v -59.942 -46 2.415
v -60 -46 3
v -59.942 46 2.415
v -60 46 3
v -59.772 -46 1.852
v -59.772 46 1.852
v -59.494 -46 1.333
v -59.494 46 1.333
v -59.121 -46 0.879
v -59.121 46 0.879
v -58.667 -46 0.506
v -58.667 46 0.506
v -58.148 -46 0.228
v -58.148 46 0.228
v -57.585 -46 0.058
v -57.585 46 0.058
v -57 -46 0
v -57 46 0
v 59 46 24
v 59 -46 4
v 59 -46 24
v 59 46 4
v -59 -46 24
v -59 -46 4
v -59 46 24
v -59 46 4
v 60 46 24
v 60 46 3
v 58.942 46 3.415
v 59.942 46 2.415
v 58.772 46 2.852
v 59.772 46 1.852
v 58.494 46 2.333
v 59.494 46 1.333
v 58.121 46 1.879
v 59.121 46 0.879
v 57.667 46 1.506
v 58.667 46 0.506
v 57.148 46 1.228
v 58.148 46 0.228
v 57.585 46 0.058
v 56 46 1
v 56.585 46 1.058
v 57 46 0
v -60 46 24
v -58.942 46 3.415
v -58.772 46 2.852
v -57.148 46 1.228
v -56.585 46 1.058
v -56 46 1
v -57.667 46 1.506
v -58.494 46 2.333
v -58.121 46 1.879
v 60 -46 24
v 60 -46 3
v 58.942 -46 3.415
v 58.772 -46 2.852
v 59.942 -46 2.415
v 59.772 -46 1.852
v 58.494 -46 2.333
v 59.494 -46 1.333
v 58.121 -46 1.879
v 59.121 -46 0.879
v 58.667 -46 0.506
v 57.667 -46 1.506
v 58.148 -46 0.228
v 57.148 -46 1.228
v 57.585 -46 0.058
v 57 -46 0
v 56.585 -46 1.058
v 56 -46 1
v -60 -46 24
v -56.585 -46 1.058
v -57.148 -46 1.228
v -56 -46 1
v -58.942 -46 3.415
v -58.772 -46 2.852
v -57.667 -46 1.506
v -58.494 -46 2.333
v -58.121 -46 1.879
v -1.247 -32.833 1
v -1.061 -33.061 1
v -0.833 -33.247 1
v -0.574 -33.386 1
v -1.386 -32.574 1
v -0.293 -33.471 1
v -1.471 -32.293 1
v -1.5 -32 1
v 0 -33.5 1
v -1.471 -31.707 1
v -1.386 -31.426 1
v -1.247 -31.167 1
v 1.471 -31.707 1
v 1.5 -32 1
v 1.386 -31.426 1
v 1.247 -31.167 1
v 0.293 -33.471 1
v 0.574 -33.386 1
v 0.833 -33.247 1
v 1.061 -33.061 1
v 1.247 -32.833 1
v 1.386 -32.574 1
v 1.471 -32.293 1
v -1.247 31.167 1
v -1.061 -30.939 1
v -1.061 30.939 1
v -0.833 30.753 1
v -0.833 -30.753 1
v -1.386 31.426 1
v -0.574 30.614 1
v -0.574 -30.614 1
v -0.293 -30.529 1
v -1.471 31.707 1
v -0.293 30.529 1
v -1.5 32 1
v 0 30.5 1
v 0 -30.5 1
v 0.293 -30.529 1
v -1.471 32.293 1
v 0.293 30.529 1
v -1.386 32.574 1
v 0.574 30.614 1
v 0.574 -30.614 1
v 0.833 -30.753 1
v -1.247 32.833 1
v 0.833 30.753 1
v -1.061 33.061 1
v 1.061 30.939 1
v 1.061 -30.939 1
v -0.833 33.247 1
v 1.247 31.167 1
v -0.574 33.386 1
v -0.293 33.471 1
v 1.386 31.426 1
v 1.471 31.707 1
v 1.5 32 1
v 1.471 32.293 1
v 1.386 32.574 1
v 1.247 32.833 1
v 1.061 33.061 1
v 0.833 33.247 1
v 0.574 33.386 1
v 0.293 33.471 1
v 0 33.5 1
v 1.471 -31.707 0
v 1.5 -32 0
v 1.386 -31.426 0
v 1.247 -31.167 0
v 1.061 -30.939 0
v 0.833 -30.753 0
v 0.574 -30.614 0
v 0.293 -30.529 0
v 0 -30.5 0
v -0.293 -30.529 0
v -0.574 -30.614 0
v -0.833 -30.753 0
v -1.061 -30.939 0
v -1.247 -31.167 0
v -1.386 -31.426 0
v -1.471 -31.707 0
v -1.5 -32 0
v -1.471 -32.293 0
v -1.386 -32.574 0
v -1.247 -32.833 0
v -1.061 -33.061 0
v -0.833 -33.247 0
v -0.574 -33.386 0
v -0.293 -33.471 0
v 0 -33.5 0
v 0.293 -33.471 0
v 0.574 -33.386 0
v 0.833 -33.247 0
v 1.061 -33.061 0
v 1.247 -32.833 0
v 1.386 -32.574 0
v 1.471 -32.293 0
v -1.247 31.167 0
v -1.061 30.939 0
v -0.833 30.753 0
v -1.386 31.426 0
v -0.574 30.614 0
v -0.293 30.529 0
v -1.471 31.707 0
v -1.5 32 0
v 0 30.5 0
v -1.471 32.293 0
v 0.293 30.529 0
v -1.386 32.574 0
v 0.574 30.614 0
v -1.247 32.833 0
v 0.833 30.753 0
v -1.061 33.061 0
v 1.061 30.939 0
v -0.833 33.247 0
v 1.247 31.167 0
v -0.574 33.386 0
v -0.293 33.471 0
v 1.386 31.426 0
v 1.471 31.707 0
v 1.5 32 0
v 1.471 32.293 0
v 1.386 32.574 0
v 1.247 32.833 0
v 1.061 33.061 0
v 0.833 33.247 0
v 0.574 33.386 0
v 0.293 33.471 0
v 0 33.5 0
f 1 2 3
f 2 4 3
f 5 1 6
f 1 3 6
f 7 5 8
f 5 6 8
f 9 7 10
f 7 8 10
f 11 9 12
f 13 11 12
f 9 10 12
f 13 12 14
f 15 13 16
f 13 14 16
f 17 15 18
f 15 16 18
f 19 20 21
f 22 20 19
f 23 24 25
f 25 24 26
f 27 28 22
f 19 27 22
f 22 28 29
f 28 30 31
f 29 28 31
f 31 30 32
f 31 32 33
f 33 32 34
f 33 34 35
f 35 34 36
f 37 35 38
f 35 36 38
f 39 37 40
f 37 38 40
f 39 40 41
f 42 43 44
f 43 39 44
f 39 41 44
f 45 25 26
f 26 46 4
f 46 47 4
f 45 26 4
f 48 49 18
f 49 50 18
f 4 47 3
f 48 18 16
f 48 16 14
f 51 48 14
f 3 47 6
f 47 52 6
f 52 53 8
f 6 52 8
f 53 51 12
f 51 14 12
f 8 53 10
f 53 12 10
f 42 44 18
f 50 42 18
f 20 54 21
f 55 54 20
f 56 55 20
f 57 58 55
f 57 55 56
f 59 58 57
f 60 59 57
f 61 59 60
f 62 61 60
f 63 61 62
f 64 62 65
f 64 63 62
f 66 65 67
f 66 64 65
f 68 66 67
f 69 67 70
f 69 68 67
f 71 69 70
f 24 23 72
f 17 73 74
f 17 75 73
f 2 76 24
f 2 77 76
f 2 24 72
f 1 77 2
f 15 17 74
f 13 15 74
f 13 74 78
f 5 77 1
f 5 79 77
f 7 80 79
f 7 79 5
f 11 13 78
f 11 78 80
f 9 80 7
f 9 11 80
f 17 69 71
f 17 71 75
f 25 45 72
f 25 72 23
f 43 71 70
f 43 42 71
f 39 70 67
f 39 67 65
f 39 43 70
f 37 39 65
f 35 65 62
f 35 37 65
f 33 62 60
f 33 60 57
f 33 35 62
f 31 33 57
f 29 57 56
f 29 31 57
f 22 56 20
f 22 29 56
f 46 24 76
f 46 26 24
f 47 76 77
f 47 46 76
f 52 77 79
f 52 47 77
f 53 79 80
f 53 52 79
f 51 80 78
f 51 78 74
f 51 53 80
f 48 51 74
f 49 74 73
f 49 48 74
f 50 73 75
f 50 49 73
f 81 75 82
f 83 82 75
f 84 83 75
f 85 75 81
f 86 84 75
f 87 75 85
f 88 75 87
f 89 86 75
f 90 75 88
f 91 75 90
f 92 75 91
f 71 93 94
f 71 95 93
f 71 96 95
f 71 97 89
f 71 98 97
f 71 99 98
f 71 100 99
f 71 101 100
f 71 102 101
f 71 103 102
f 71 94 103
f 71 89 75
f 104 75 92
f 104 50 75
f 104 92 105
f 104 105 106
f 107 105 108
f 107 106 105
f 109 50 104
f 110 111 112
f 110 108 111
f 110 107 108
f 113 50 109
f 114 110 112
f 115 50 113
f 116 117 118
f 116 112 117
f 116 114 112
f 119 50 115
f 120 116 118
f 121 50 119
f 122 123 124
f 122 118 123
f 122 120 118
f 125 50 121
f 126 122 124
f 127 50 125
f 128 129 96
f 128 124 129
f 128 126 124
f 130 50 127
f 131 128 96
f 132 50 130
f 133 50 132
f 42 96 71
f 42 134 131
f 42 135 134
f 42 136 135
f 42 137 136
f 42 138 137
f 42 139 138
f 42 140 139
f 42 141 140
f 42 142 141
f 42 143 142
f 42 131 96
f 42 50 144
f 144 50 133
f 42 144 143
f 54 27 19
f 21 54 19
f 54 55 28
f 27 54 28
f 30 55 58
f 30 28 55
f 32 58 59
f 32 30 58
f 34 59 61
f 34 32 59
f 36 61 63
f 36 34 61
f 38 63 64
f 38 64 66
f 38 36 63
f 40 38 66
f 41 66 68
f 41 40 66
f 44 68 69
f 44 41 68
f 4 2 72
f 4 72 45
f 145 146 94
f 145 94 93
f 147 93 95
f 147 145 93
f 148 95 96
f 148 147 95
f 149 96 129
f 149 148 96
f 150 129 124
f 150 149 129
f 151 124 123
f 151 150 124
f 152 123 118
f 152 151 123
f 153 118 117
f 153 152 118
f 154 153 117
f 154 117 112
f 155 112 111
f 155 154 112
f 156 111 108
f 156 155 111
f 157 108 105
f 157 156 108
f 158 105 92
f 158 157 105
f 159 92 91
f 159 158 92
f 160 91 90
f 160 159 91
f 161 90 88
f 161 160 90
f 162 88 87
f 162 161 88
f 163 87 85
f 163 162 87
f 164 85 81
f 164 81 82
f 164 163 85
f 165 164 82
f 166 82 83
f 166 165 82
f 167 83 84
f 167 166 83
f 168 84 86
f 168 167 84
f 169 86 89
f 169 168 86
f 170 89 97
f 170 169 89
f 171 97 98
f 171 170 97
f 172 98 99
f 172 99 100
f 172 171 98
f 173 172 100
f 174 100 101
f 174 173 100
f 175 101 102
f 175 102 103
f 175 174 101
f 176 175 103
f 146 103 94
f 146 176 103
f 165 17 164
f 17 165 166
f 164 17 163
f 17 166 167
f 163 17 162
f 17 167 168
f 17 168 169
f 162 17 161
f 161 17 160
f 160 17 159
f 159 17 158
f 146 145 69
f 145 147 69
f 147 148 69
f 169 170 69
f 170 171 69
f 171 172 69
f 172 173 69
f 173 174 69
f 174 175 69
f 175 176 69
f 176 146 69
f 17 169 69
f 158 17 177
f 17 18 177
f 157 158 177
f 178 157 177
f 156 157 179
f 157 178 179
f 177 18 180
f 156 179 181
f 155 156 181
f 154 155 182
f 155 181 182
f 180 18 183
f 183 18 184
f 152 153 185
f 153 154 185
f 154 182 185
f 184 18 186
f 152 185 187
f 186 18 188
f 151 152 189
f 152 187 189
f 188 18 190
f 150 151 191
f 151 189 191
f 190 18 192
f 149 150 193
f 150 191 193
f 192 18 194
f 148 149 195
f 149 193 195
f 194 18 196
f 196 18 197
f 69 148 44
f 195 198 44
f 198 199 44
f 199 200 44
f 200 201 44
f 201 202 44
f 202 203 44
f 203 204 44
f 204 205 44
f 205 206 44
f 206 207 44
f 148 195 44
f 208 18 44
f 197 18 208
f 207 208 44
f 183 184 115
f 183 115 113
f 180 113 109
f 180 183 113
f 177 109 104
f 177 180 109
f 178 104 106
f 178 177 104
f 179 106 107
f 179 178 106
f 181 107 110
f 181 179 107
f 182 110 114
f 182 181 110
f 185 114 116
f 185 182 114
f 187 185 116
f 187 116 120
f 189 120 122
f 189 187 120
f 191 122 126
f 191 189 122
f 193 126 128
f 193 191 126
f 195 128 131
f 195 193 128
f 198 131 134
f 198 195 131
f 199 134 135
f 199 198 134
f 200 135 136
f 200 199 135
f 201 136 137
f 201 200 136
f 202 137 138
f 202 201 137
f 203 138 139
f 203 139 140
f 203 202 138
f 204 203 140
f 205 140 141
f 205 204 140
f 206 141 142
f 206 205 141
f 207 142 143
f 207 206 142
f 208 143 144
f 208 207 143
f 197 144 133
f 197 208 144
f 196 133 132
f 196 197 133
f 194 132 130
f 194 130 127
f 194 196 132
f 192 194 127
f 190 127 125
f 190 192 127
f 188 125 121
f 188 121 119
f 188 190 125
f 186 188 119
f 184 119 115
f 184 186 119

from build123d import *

# Parameters (mm, degrees)
SKETCH1_W           = 120
SKETCH1_H           = 92
SKETCH1_R           = 1.5
BOSS_EXTRUDE1_DEPTH = 1
SKETCH2_W           = 1
SKETCH2_H           = 92
BOSS_EXTRUDE2_DEPTH = 23
FILLET1_R           = 3
FILLET2_R           = 3
FILLET3_R           = 3


with BuildPart() as part:
    # Sketch1 → Boss-Extrude1 (new body)
    with BuildSketch(Plane.XY):
        Rectangle(SKETCH1_W, SKETCH1_H)
        with Locations((0, -32)):
            Circle(SKETCH1_R, mode=Mode.SUBTRACT)
        with Locations(Location((0, 32, 0), (0, 0, 180))):
            Circle(SKETCH1_R, mode=Mode.SUBTRACT)
    extrude(amount=BOSS_EXTRUDE1_DEPTH)

    # Sketch2 → Boss-Extrude2 (add)
    with BuildSketch(Plane.XY.offset(1)):
        with Locations((-59.5, 0)):
            Rectangle(SKETCH2_W, SKETCH2_H)
    boss_extrude2 = extrude(amount=BOSS_EXTRUDE2_DEPTH)

    # Fillet1
    fillet1_edges = [part.edges().sort_by_distance(p)[0] for p in [
        (-60, 0, 0),
    ]]
    fillet(fillet1_edges, radius=FILLET1_R)

    # Fillet2
    fillet2_edges = [part.edges().sort_by_distance(p)[0] for p in [
        (-59, 0, 1),
    ]]
    fillet(fillet2_edges, radius=FILLET2_R)

    # Mirror3: Boss-Extrude2 across plane
    add(boss_extrude2.mirror(Plane(origin=(0, 0, 0), x_dir=(0, 0, 1), z_dir=(1, 0, 0))))

    # Fillet3
    fillet3_edges = [part.edges().sort_by_distance(p)[0] for p in [
        (59, 0, 1),
        (60, 0, 0),
    ]]
    fillet(fillet3_edges, radius=FILLET3_R)


solid = part.part
